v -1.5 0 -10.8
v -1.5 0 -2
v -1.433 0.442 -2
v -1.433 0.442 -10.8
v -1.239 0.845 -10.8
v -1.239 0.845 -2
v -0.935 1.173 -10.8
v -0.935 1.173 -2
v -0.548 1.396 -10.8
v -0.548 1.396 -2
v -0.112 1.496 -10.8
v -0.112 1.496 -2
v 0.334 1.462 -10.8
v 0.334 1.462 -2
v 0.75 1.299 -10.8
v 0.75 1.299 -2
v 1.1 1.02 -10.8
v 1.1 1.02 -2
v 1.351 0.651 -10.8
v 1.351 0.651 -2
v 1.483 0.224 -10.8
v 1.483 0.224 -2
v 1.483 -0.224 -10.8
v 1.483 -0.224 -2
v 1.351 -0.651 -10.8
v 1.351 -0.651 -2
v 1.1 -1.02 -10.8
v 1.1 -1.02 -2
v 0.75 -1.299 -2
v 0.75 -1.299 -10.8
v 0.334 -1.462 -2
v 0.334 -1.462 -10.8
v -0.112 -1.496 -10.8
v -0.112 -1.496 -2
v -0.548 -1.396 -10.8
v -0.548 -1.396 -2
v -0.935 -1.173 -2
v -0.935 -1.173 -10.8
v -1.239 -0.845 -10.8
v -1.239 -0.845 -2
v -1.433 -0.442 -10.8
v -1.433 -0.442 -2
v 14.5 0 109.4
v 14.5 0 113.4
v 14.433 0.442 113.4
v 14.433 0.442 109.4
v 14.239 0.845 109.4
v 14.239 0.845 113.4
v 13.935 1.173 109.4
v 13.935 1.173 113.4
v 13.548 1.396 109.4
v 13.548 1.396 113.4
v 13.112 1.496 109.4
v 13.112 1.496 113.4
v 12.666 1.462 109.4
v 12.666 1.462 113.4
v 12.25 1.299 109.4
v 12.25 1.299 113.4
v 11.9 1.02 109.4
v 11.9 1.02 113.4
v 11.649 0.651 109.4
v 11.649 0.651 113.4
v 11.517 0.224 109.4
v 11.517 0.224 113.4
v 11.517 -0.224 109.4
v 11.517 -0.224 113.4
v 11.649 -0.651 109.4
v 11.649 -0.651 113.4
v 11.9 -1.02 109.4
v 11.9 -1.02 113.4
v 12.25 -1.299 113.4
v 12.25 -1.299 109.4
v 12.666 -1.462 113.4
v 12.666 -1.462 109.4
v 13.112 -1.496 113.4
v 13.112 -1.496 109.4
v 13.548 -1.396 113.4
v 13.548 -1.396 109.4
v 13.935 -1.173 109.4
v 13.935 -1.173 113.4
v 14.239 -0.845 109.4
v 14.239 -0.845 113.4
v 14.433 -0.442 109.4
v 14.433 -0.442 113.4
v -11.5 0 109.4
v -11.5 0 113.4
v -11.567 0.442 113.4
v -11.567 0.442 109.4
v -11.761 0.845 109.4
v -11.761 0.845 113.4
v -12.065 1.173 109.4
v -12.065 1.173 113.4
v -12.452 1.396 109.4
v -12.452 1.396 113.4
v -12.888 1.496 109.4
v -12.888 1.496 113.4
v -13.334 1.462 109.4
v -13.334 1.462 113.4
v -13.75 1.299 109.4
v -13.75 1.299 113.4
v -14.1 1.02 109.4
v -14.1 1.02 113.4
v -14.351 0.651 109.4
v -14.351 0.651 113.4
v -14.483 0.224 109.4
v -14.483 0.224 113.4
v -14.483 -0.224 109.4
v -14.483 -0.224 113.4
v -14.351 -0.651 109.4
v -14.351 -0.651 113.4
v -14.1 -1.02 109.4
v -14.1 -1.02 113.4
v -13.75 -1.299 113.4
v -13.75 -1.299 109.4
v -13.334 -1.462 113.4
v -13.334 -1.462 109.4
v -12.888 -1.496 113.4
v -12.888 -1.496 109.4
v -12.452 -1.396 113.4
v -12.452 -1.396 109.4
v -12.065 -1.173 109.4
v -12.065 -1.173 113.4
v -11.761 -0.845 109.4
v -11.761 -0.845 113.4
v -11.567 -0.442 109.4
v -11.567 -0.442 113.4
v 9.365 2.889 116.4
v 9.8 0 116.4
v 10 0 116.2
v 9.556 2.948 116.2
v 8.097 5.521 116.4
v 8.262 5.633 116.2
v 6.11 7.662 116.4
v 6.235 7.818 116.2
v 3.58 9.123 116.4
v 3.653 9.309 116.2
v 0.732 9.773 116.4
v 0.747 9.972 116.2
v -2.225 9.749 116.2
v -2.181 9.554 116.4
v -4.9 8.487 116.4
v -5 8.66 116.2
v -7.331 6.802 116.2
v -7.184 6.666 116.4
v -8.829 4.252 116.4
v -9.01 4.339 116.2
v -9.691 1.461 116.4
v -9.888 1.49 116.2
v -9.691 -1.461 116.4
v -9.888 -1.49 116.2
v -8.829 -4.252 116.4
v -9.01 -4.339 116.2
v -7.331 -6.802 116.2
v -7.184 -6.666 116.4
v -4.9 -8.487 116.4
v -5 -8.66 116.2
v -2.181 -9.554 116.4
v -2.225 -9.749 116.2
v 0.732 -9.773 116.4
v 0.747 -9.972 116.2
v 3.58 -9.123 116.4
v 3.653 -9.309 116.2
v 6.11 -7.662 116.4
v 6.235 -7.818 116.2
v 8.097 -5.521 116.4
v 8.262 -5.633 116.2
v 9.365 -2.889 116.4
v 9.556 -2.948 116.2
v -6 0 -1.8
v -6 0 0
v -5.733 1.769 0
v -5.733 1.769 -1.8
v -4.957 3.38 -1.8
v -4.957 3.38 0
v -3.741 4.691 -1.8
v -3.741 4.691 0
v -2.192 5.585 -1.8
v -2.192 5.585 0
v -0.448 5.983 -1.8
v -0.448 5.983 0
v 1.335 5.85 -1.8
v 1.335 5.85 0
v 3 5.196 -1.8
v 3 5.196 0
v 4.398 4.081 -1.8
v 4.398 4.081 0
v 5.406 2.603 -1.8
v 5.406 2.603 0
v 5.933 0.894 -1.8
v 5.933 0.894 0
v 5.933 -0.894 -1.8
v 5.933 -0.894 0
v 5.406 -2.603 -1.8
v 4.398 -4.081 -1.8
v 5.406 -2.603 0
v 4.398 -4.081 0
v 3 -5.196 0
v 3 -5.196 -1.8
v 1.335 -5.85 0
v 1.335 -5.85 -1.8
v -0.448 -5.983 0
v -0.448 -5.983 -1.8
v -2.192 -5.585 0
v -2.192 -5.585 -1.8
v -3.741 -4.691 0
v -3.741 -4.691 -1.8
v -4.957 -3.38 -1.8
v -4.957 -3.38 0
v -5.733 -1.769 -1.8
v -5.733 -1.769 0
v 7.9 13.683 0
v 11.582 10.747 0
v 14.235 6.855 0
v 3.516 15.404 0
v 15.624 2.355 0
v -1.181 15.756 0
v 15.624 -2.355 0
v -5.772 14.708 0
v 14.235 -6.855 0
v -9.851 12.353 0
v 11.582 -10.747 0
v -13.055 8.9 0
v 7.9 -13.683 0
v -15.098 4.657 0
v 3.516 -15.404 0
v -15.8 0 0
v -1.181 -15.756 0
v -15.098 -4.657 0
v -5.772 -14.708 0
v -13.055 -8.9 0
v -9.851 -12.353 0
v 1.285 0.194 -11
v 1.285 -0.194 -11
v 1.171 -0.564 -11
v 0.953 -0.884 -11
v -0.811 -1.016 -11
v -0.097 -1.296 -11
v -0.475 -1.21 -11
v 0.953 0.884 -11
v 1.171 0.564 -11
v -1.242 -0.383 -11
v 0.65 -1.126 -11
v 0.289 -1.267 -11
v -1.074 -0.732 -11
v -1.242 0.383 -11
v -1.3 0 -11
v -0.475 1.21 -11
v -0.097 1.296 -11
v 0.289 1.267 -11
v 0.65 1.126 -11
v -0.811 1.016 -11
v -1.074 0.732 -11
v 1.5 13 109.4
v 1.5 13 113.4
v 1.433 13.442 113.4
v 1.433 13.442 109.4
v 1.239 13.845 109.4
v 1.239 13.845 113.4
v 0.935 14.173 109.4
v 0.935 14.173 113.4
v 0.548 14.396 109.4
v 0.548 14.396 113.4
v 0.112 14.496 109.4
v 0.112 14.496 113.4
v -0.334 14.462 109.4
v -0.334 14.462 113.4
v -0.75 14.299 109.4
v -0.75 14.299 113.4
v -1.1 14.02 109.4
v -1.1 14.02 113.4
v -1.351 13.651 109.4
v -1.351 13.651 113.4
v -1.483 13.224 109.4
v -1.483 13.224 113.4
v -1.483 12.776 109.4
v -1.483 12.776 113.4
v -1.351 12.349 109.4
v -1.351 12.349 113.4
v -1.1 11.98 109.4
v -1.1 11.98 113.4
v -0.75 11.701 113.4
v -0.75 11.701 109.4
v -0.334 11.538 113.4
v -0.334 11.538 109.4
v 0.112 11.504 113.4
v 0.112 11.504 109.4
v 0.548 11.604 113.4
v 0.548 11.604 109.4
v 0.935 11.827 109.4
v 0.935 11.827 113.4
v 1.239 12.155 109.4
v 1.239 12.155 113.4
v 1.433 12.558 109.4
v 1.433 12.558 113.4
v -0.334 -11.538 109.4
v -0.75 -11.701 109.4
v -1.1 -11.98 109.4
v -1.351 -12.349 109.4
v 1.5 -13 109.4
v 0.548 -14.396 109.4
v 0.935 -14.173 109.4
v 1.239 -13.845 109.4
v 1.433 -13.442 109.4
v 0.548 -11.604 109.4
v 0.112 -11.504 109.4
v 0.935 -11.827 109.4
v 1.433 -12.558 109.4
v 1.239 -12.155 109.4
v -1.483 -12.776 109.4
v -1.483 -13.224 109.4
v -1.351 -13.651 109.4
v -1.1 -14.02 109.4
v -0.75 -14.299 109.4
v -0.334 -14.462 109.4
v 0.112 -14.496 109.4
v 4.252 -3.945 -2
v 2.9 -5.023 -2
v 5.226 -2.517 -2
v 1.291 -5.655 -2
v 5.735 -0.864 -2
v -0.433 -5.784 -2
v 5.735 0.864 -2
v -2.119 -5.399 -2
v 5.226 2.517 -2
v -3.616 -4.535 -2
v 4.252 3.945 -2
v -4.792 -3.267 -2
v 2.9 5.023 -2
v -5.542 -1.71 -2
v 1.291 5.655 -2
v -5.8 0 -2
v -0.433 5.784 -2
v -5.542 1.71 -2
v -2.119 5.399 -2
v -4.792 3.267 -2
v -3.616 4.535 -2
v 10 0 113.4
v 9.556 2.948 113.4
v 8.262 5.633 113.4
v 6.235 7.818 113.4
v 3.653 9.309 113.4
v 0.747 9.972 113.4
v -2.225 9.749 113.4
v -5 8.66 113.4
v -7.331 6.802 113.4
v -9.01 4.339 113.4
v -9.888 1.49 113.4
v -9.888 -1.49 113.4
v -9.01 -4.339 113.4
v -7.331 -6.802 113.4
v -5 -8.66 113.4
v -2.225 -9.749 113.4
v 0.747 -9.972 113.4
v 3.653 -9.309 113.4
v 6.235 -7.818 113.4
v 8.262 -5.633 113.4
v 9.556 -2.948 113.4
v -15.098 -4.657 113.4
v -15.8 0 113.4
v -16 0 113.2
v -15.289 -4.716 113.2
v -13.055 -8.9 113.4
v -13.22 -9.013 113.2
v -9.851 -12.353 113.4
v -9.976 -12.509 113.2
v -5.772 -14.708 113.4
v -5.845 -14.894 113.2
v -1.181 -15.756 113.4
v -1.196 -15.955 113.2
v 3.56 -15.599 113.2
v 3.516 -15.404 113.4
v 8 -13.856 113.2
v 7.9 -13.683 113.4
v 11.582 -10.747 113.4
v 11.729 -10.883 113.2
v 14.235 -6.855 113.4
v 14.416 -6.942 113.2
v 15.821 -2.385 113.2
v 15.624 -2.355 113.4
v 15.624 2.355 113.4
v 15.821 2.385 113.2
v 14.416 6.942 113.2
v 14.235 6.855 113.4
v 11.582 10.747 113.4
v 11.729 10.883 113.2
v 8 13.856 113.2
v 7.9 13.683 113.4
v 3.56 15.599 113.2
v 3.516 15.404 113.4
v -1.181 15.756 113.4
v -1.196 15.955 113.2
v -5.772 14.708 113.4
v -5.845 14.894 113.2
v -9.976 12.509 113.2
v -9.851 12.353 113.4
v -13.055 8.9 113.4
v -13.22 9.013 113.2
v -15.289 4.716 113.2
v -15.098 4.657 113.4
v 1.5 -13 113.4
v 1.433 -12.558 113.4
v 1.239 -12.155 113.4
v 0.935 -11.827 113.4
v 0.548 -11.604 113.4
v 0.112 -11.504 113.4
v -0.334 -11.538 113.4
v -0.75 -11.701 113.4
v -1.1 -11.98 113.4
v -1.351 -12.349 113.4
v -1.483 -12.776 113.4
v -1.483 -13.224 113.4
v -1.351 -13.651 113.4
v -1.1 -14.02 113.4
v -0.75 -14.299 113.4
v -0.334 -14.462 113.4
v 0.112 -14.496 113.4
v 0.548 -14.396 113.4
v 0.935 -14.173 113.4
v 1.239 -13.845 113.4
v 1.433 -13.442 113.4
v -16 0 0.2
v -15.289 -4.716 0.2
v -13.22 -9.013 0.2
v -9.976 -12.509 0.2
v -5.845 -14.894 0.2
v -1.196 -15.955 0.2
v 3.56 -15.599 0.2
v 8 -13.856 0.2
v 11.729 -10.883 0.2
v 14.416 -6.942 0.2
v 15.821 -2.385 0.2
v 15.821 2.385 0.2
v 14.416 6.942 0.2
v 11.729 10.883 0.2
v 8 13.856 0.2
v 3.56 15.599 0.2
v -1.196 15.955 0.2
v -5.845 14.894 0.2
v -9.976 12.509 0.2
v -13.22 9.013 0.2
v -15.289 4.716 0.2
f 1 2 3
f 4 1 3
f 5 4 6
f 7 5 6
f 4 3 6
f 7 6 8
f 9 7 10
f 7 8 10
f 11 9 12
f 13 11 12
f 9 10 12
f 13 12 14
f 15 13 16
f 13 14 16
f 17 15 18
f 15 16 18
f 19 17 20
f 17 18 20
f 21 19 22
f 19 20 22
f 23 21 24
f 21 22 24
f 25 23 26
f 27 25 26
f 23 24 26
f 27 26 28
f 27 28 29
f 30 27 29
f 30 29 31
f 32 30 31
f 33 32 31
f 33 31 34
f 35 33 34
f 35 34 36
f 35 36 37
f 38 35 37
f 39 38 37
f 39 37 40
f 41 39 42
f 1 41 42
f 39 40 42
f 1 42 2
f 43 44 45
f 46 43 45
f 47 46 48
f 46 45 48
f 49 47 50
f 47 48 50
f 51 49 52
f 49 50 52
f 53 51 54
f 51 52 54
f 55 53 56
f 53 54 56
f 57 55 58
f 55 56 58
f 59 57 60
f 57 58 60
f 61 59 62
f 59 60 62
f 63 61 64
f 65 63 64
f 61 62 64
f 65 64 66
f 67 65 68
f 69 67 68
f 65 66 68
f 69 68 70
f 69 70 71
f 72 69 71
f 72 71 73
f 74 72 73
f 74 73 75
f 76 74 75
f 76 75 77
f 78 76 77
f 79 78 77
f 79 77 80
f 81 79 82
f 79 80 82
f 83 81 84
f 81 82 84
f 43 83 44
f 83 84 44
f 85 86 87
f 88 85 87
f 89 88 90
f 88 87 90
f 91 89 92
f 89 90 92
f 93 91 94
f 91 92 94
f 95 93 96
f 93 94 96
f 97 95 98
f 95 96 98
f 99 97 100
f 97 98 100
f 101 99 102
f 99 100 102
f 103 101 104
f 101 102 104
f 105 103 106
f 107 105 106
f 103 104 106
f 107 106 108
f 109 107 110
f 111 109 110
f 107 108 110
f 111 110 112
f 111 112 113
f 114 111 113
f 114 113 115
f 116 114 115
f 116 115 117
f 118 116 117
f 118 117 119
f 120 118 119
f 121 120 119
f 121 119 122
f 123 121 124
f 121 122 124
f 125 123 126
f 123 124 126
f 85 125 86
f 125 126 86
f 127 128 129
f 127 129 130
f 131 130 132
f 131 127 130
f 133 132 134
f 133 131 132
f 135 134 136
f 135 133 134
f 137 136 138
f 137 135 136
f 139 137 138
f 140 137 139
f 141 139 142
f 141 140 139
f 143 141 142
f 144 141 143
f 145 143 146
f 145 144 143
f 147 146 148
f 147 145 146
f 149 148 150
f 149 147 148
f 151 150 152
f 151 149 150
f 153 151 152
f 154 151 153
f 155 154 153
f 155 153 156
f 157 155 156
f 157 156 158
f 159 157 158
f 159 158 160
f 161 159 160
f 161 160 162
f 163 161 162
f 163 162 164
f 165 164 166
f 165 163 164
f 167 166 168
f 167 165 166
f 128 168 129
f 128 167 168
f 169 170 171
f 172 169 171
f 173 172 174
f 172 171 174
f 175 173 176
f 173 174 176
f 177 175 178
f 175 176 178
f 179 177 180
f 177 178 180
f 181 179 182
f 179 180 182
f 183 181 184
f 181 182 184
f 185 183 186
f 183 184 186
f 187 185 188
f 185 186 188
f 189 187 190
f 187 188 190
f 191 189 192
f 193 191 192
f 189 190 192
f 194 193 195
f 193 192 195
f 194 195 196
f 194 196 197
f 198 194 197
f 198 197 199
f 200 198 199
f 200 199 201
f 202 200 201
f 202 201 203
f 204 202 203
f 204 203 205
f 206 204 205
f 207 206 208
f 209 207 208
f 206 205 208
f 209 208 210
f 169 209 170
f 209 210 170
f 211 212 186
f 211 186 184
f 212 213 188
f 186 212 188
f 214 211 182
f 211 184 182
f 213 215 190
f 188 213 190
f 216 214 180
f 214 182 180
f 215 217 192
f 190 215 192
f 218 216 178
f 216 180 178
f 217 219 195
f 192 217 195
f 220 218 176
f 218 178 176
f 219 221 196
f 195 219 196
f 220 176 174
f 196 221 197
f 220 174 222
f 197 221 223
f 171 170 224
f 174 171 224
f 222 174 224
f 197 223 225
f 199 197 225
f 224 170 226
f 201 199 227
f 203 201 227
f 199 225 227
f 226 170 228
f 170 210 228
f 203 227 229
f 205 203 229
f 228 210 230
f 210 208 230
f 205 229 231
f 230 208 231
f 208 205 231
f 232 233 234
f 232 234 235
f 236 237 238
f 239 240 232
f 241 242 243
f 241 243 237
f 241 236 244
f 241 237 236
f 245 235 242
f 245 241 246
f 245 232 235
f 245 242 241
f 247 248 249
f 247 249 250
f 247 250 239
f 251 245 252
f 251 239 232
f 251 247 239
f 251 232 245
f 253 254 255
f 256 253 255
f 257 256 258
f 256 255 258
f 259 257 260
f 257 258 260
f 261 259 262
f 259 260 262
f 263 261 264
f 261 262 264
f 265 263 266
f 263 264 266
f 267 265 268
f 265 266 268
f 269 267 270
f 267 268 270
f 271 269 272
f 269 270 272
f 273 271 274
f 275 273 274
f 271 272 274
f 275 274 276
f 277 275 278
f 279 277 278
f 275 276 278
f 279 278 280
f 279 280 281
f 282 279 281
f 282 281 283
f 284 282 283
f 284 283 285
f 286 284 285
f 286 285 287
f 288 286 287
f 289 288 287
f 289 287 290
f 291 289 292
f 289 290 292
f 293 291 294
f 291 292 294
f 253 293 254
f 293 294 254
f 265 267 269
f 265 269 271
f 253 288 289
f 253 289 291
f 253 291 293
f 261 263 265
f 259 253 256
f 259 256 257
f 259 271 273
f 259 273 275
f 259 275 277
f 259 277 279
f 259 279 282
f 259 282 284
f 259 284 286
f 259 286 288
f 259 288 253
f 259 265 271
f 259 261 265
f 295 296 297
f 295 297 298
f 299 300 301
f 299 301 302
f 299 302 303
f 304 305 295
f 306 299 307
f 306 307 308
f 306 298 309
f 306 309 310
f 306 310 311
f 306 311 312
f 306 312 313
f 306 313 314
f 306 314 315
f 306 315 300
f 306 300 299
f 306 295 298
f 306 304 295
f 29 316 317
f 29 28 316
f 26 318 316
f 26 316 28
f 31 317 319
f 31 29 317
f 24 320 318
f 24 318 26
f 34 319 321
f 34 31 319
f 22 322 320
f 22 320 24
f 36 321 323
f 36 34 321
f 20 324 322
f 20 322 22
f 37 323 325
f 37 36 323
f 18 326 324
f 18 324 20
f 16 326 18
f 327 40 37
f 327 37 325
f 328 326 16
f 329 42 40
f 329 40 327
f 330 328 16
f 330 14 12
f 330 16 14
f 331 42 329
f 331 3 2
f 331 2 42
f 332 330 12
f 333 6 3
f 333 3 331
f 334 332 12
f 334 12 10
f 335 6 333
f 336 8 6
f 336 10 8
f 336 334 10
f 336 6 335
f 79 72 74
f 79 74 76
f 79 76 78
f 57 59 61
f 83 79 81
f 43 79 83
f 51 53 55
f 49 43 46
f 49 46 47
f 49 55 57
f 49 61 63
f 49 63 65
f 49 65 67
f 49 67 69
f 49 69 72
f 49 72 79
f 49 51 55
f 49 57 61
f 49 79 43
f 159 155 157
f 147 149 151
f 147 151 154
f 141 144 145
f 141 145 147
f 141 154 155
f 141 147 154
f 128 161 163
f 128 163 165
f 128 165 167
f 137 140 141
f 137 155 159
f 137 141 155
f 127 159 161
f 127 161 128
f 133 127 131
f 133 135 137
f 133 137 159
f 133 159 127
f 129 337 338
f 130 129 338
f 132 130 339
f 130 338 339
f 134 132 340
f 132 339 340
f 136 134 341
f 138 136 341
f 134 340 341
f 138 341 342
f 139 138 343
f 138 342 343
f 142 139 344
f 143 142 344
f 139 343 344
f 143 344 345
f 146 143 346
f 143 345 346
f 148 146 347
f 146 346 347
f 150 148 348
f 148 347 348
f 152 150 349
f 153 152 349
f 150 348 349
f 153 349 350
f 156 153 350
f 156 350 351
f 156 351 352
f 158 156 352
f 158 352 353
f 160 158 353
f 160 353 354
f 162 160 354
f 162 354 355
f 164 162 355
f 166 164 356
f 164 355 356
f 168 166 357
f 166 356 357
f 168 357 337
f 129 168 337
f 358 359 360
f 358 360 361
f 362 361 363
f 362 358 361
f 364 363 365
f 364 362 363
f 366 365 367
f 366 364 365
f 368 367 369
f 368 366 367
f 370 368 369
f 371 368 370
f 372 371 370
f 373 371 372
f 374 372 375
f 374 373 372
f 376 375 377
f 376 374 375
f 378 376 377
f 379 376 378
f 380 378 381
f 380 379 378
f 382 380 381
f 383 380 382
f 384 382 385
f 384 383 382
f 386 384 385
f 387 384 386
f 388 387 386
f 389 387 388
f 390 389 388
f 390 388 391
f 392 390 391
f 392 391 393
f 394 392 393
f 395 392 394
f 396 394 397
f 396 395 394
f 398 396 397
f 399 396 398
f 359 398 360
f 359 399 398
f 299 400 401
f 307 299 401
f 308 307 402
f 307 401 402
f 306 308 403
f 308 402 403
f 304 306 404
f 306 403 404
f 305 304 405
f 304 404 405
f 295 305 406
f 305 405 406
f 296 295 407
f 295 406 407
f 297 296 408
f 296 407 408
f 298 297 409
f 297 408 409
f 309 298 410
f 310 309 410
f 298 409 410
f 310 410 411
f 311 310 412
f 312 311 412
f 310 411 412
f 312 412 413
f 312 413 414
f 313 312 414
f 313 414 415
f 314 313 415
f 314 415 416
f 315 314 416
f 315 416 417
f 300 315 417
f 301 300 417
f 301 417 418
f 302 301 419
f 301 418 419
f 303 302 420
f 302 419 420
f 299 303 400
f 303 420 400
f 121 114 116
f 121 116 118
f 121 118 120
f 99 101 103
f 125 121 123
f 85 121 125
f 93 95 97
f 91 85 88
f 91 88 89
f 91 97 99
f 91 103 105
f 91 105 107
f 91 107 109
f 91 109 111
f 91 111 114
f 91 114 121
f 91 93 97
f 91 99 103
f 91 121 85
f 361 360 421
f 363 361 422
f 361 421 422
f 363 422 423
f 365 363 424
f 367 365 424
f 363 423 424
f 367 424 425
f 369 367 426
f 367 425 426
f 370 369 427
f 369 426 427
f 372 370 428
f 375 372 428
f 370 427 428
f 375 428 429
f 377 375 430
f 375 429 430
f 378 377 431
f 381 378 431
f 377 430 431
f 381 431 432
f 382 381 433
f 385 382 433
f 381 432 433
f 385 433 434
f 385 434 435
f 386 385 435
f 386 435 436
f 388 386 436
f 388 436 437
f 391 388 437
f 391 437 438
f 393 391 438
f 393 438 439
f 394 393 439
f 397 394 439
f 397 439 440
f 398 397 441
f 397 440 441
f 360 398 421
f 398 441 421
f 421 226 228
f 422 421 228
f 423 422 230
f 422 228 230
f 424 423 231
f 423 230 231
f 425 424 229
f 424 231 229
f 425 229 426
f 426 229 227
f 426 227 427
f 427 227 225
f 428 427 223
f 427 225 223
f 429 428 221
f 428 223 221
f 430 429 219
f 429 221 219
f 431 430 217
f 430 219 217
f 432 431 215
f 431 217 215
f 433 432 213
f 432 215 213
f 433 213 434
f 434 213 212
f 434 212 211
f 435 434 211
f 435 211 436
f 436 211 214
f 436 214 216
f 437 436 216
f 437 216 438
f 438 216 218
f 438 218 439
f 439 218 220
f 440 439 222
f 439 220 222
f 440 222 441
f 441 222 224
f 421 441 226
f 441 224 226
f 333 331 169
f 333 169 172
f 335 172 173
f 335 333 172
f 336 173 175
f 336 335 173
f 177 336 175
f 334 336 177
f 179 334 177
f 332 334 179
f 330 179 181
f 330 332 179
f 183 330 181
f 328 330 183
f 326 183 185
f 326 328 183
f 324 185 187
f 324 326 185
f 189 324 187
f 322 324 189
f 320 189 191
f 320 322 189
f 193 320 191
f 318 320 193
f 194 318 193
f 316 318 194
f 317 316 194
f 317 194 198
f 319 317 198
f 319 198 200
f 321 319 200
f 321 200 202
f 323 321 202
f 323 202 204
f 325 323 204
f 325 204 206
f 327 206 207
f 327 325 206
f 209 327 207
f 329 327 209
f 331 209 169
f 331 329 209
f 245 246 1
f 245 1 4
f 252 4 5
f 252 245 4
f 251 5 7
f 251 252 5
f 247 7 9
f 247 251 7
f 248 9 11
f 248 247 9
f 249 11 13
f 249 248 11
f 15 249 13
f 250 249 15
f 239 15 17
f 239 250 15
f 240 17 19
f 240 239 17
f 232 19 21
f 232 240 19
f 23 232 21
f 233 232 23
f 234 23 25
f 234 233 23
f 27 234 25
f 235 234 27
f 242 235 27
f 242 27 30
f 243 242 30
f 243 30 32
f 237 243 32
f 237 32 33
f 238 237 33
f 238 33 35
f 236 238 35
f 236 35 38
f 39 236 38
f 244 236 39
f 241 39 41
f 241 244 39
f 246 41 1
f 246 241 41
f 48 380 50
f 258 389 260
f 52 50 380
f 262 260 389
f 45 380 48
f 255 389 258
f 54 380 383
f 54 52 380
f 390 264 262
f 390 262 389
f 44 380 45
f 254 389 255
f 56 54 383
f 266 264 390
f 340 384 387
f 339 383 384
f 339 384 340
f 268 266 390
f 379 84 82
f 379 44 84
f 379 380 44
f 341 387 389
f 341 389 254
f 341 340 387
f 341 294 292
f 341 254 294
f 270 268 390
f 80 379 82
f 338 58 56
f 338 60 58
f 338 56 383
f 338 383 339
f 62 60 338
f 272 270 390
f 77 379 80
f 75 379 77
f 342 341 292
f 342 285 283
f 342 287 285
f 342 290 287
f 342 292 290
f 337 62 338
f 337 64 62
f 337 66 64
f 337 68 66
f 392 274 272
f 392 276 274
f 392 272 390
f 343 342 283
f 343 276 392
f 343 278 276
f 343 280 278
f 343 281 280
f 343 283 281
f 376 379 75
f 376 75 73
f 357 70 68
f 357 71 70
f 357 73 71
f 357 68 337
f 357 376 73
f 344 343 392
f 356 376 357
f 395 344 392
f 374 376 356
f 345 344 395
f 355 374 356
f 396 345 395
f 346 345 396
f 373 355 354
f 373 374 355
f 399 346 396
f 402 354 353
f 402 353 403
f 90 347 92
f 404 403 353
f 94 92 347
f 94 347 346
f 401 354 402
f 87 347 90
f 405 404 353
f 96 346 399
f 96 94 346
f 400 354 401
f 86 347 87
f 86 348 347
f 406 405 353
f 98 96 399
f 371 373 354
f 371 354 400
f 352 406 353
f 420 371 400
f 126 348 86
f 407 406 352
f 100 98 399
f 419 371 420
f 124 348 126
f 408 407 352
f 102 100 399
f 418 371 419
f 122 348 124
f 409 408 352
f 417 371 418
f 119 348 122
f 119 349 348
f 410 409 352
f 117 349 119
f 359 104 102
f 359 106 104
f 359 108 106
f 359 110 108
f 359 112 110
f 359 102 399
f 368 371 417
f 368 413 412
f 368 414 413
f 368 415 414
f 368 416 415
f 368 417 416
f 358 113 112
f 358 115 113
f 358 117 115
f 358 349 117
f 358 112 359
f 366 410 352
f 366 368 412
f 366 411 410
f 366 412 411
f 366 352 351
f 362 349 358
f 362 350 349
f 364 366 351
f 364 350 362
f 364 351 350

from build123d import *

# Parameters (mm, degrees)
CROQUIS1_R              = 16
SALIENTE_EXTRUIR1_DEPTH = 113.4
CROQUIS2_R              = 10
SALIENTE_EXTRUIR2_DEPTH = 3
CROQUIS3_R              = 6
SALIENTE_EXTRUIR3_DEPTH = 2
CROQUIS4_R              = 1.5
SALIENTE_EXTRUIR4_DEPTH = 9
CHAFL_N1_SIZE           = 0.2
CROQUIS5_R              = 1.5
CORTAR_EXTRUIR1_DEPTH   = 4


with BuildPart() as part:
    # Croquis1 → Saliente-Extruir1 (new body)
    with BuildSketch(Plane.XY):
        with Locations(Location((0, 0, 0), (0, 0, 180))):
            Circle(CROQUIS1_R)
    extrude(amount=SALIENTE_EXTRUIR1_DEPTH)

    # Croquis2 → Saliente-Extruir2 (add)
    with BuildSketch(Plane.XY.offset(113.4)):
        Circle(CROQUIS2_R)
    extrude(amount=SALIENTE_EXTRUIR2_DEPTH)

    # Croquis3 → Saliente-Extruir3 (add)
    with BuildSketch(Plane(origin=(0, 0, 0), x_dir=(-1, 0, 0), z_dir=(0, 0, -1))):
        Circle(CROQUIS3_R)
    extrude(amount=SALIENTE_EXTRUIR3_DEPTH)

    # Croquis4 → Saliente-Extruir4 (add)
    with BuildSketch(Plane(origin=(0, 0, -2), x_dir=(-1, 0, 0), z_dir=(0, 0, -1))):
        Circle(CROQUIS4_R)
    extrude(amount=SALIENTE_EXTRUIR4_DEPTH)

    # Chaflán1
    chafl_n1_edges = [part.edges().sort_by_distance(p)[0] for p in [
        (6, 0, -2),
        (1.5, 0, -11),
        (16, 0, 0),
        (16, 0, 113.4),
        (-10, 0, 116.4),
    ]]
    chamfer(chafl_n1_edges, length=CHAFL_N1_SIZE)

    # Croquis5 → Cortar-Extruir1 (cut)
    with BuildSketch(Plane.XY.offset(113.4)):
        with Locations((0, 13)):
            Circle(CROQUIS5_R)
        with Locations((13, 0)):
            Circle(CROQUIS5_R)
        with Locations((0, -13)):
            Circle(CROQUIS5_R)
        with Locations((-13, 0)):
            Circle(CROQUIS5_R)
    extrude(amount=-CORTAR_EXTRUIR1_DEPTH, mode=Mode.SUBTRACT)


solid = part.part
